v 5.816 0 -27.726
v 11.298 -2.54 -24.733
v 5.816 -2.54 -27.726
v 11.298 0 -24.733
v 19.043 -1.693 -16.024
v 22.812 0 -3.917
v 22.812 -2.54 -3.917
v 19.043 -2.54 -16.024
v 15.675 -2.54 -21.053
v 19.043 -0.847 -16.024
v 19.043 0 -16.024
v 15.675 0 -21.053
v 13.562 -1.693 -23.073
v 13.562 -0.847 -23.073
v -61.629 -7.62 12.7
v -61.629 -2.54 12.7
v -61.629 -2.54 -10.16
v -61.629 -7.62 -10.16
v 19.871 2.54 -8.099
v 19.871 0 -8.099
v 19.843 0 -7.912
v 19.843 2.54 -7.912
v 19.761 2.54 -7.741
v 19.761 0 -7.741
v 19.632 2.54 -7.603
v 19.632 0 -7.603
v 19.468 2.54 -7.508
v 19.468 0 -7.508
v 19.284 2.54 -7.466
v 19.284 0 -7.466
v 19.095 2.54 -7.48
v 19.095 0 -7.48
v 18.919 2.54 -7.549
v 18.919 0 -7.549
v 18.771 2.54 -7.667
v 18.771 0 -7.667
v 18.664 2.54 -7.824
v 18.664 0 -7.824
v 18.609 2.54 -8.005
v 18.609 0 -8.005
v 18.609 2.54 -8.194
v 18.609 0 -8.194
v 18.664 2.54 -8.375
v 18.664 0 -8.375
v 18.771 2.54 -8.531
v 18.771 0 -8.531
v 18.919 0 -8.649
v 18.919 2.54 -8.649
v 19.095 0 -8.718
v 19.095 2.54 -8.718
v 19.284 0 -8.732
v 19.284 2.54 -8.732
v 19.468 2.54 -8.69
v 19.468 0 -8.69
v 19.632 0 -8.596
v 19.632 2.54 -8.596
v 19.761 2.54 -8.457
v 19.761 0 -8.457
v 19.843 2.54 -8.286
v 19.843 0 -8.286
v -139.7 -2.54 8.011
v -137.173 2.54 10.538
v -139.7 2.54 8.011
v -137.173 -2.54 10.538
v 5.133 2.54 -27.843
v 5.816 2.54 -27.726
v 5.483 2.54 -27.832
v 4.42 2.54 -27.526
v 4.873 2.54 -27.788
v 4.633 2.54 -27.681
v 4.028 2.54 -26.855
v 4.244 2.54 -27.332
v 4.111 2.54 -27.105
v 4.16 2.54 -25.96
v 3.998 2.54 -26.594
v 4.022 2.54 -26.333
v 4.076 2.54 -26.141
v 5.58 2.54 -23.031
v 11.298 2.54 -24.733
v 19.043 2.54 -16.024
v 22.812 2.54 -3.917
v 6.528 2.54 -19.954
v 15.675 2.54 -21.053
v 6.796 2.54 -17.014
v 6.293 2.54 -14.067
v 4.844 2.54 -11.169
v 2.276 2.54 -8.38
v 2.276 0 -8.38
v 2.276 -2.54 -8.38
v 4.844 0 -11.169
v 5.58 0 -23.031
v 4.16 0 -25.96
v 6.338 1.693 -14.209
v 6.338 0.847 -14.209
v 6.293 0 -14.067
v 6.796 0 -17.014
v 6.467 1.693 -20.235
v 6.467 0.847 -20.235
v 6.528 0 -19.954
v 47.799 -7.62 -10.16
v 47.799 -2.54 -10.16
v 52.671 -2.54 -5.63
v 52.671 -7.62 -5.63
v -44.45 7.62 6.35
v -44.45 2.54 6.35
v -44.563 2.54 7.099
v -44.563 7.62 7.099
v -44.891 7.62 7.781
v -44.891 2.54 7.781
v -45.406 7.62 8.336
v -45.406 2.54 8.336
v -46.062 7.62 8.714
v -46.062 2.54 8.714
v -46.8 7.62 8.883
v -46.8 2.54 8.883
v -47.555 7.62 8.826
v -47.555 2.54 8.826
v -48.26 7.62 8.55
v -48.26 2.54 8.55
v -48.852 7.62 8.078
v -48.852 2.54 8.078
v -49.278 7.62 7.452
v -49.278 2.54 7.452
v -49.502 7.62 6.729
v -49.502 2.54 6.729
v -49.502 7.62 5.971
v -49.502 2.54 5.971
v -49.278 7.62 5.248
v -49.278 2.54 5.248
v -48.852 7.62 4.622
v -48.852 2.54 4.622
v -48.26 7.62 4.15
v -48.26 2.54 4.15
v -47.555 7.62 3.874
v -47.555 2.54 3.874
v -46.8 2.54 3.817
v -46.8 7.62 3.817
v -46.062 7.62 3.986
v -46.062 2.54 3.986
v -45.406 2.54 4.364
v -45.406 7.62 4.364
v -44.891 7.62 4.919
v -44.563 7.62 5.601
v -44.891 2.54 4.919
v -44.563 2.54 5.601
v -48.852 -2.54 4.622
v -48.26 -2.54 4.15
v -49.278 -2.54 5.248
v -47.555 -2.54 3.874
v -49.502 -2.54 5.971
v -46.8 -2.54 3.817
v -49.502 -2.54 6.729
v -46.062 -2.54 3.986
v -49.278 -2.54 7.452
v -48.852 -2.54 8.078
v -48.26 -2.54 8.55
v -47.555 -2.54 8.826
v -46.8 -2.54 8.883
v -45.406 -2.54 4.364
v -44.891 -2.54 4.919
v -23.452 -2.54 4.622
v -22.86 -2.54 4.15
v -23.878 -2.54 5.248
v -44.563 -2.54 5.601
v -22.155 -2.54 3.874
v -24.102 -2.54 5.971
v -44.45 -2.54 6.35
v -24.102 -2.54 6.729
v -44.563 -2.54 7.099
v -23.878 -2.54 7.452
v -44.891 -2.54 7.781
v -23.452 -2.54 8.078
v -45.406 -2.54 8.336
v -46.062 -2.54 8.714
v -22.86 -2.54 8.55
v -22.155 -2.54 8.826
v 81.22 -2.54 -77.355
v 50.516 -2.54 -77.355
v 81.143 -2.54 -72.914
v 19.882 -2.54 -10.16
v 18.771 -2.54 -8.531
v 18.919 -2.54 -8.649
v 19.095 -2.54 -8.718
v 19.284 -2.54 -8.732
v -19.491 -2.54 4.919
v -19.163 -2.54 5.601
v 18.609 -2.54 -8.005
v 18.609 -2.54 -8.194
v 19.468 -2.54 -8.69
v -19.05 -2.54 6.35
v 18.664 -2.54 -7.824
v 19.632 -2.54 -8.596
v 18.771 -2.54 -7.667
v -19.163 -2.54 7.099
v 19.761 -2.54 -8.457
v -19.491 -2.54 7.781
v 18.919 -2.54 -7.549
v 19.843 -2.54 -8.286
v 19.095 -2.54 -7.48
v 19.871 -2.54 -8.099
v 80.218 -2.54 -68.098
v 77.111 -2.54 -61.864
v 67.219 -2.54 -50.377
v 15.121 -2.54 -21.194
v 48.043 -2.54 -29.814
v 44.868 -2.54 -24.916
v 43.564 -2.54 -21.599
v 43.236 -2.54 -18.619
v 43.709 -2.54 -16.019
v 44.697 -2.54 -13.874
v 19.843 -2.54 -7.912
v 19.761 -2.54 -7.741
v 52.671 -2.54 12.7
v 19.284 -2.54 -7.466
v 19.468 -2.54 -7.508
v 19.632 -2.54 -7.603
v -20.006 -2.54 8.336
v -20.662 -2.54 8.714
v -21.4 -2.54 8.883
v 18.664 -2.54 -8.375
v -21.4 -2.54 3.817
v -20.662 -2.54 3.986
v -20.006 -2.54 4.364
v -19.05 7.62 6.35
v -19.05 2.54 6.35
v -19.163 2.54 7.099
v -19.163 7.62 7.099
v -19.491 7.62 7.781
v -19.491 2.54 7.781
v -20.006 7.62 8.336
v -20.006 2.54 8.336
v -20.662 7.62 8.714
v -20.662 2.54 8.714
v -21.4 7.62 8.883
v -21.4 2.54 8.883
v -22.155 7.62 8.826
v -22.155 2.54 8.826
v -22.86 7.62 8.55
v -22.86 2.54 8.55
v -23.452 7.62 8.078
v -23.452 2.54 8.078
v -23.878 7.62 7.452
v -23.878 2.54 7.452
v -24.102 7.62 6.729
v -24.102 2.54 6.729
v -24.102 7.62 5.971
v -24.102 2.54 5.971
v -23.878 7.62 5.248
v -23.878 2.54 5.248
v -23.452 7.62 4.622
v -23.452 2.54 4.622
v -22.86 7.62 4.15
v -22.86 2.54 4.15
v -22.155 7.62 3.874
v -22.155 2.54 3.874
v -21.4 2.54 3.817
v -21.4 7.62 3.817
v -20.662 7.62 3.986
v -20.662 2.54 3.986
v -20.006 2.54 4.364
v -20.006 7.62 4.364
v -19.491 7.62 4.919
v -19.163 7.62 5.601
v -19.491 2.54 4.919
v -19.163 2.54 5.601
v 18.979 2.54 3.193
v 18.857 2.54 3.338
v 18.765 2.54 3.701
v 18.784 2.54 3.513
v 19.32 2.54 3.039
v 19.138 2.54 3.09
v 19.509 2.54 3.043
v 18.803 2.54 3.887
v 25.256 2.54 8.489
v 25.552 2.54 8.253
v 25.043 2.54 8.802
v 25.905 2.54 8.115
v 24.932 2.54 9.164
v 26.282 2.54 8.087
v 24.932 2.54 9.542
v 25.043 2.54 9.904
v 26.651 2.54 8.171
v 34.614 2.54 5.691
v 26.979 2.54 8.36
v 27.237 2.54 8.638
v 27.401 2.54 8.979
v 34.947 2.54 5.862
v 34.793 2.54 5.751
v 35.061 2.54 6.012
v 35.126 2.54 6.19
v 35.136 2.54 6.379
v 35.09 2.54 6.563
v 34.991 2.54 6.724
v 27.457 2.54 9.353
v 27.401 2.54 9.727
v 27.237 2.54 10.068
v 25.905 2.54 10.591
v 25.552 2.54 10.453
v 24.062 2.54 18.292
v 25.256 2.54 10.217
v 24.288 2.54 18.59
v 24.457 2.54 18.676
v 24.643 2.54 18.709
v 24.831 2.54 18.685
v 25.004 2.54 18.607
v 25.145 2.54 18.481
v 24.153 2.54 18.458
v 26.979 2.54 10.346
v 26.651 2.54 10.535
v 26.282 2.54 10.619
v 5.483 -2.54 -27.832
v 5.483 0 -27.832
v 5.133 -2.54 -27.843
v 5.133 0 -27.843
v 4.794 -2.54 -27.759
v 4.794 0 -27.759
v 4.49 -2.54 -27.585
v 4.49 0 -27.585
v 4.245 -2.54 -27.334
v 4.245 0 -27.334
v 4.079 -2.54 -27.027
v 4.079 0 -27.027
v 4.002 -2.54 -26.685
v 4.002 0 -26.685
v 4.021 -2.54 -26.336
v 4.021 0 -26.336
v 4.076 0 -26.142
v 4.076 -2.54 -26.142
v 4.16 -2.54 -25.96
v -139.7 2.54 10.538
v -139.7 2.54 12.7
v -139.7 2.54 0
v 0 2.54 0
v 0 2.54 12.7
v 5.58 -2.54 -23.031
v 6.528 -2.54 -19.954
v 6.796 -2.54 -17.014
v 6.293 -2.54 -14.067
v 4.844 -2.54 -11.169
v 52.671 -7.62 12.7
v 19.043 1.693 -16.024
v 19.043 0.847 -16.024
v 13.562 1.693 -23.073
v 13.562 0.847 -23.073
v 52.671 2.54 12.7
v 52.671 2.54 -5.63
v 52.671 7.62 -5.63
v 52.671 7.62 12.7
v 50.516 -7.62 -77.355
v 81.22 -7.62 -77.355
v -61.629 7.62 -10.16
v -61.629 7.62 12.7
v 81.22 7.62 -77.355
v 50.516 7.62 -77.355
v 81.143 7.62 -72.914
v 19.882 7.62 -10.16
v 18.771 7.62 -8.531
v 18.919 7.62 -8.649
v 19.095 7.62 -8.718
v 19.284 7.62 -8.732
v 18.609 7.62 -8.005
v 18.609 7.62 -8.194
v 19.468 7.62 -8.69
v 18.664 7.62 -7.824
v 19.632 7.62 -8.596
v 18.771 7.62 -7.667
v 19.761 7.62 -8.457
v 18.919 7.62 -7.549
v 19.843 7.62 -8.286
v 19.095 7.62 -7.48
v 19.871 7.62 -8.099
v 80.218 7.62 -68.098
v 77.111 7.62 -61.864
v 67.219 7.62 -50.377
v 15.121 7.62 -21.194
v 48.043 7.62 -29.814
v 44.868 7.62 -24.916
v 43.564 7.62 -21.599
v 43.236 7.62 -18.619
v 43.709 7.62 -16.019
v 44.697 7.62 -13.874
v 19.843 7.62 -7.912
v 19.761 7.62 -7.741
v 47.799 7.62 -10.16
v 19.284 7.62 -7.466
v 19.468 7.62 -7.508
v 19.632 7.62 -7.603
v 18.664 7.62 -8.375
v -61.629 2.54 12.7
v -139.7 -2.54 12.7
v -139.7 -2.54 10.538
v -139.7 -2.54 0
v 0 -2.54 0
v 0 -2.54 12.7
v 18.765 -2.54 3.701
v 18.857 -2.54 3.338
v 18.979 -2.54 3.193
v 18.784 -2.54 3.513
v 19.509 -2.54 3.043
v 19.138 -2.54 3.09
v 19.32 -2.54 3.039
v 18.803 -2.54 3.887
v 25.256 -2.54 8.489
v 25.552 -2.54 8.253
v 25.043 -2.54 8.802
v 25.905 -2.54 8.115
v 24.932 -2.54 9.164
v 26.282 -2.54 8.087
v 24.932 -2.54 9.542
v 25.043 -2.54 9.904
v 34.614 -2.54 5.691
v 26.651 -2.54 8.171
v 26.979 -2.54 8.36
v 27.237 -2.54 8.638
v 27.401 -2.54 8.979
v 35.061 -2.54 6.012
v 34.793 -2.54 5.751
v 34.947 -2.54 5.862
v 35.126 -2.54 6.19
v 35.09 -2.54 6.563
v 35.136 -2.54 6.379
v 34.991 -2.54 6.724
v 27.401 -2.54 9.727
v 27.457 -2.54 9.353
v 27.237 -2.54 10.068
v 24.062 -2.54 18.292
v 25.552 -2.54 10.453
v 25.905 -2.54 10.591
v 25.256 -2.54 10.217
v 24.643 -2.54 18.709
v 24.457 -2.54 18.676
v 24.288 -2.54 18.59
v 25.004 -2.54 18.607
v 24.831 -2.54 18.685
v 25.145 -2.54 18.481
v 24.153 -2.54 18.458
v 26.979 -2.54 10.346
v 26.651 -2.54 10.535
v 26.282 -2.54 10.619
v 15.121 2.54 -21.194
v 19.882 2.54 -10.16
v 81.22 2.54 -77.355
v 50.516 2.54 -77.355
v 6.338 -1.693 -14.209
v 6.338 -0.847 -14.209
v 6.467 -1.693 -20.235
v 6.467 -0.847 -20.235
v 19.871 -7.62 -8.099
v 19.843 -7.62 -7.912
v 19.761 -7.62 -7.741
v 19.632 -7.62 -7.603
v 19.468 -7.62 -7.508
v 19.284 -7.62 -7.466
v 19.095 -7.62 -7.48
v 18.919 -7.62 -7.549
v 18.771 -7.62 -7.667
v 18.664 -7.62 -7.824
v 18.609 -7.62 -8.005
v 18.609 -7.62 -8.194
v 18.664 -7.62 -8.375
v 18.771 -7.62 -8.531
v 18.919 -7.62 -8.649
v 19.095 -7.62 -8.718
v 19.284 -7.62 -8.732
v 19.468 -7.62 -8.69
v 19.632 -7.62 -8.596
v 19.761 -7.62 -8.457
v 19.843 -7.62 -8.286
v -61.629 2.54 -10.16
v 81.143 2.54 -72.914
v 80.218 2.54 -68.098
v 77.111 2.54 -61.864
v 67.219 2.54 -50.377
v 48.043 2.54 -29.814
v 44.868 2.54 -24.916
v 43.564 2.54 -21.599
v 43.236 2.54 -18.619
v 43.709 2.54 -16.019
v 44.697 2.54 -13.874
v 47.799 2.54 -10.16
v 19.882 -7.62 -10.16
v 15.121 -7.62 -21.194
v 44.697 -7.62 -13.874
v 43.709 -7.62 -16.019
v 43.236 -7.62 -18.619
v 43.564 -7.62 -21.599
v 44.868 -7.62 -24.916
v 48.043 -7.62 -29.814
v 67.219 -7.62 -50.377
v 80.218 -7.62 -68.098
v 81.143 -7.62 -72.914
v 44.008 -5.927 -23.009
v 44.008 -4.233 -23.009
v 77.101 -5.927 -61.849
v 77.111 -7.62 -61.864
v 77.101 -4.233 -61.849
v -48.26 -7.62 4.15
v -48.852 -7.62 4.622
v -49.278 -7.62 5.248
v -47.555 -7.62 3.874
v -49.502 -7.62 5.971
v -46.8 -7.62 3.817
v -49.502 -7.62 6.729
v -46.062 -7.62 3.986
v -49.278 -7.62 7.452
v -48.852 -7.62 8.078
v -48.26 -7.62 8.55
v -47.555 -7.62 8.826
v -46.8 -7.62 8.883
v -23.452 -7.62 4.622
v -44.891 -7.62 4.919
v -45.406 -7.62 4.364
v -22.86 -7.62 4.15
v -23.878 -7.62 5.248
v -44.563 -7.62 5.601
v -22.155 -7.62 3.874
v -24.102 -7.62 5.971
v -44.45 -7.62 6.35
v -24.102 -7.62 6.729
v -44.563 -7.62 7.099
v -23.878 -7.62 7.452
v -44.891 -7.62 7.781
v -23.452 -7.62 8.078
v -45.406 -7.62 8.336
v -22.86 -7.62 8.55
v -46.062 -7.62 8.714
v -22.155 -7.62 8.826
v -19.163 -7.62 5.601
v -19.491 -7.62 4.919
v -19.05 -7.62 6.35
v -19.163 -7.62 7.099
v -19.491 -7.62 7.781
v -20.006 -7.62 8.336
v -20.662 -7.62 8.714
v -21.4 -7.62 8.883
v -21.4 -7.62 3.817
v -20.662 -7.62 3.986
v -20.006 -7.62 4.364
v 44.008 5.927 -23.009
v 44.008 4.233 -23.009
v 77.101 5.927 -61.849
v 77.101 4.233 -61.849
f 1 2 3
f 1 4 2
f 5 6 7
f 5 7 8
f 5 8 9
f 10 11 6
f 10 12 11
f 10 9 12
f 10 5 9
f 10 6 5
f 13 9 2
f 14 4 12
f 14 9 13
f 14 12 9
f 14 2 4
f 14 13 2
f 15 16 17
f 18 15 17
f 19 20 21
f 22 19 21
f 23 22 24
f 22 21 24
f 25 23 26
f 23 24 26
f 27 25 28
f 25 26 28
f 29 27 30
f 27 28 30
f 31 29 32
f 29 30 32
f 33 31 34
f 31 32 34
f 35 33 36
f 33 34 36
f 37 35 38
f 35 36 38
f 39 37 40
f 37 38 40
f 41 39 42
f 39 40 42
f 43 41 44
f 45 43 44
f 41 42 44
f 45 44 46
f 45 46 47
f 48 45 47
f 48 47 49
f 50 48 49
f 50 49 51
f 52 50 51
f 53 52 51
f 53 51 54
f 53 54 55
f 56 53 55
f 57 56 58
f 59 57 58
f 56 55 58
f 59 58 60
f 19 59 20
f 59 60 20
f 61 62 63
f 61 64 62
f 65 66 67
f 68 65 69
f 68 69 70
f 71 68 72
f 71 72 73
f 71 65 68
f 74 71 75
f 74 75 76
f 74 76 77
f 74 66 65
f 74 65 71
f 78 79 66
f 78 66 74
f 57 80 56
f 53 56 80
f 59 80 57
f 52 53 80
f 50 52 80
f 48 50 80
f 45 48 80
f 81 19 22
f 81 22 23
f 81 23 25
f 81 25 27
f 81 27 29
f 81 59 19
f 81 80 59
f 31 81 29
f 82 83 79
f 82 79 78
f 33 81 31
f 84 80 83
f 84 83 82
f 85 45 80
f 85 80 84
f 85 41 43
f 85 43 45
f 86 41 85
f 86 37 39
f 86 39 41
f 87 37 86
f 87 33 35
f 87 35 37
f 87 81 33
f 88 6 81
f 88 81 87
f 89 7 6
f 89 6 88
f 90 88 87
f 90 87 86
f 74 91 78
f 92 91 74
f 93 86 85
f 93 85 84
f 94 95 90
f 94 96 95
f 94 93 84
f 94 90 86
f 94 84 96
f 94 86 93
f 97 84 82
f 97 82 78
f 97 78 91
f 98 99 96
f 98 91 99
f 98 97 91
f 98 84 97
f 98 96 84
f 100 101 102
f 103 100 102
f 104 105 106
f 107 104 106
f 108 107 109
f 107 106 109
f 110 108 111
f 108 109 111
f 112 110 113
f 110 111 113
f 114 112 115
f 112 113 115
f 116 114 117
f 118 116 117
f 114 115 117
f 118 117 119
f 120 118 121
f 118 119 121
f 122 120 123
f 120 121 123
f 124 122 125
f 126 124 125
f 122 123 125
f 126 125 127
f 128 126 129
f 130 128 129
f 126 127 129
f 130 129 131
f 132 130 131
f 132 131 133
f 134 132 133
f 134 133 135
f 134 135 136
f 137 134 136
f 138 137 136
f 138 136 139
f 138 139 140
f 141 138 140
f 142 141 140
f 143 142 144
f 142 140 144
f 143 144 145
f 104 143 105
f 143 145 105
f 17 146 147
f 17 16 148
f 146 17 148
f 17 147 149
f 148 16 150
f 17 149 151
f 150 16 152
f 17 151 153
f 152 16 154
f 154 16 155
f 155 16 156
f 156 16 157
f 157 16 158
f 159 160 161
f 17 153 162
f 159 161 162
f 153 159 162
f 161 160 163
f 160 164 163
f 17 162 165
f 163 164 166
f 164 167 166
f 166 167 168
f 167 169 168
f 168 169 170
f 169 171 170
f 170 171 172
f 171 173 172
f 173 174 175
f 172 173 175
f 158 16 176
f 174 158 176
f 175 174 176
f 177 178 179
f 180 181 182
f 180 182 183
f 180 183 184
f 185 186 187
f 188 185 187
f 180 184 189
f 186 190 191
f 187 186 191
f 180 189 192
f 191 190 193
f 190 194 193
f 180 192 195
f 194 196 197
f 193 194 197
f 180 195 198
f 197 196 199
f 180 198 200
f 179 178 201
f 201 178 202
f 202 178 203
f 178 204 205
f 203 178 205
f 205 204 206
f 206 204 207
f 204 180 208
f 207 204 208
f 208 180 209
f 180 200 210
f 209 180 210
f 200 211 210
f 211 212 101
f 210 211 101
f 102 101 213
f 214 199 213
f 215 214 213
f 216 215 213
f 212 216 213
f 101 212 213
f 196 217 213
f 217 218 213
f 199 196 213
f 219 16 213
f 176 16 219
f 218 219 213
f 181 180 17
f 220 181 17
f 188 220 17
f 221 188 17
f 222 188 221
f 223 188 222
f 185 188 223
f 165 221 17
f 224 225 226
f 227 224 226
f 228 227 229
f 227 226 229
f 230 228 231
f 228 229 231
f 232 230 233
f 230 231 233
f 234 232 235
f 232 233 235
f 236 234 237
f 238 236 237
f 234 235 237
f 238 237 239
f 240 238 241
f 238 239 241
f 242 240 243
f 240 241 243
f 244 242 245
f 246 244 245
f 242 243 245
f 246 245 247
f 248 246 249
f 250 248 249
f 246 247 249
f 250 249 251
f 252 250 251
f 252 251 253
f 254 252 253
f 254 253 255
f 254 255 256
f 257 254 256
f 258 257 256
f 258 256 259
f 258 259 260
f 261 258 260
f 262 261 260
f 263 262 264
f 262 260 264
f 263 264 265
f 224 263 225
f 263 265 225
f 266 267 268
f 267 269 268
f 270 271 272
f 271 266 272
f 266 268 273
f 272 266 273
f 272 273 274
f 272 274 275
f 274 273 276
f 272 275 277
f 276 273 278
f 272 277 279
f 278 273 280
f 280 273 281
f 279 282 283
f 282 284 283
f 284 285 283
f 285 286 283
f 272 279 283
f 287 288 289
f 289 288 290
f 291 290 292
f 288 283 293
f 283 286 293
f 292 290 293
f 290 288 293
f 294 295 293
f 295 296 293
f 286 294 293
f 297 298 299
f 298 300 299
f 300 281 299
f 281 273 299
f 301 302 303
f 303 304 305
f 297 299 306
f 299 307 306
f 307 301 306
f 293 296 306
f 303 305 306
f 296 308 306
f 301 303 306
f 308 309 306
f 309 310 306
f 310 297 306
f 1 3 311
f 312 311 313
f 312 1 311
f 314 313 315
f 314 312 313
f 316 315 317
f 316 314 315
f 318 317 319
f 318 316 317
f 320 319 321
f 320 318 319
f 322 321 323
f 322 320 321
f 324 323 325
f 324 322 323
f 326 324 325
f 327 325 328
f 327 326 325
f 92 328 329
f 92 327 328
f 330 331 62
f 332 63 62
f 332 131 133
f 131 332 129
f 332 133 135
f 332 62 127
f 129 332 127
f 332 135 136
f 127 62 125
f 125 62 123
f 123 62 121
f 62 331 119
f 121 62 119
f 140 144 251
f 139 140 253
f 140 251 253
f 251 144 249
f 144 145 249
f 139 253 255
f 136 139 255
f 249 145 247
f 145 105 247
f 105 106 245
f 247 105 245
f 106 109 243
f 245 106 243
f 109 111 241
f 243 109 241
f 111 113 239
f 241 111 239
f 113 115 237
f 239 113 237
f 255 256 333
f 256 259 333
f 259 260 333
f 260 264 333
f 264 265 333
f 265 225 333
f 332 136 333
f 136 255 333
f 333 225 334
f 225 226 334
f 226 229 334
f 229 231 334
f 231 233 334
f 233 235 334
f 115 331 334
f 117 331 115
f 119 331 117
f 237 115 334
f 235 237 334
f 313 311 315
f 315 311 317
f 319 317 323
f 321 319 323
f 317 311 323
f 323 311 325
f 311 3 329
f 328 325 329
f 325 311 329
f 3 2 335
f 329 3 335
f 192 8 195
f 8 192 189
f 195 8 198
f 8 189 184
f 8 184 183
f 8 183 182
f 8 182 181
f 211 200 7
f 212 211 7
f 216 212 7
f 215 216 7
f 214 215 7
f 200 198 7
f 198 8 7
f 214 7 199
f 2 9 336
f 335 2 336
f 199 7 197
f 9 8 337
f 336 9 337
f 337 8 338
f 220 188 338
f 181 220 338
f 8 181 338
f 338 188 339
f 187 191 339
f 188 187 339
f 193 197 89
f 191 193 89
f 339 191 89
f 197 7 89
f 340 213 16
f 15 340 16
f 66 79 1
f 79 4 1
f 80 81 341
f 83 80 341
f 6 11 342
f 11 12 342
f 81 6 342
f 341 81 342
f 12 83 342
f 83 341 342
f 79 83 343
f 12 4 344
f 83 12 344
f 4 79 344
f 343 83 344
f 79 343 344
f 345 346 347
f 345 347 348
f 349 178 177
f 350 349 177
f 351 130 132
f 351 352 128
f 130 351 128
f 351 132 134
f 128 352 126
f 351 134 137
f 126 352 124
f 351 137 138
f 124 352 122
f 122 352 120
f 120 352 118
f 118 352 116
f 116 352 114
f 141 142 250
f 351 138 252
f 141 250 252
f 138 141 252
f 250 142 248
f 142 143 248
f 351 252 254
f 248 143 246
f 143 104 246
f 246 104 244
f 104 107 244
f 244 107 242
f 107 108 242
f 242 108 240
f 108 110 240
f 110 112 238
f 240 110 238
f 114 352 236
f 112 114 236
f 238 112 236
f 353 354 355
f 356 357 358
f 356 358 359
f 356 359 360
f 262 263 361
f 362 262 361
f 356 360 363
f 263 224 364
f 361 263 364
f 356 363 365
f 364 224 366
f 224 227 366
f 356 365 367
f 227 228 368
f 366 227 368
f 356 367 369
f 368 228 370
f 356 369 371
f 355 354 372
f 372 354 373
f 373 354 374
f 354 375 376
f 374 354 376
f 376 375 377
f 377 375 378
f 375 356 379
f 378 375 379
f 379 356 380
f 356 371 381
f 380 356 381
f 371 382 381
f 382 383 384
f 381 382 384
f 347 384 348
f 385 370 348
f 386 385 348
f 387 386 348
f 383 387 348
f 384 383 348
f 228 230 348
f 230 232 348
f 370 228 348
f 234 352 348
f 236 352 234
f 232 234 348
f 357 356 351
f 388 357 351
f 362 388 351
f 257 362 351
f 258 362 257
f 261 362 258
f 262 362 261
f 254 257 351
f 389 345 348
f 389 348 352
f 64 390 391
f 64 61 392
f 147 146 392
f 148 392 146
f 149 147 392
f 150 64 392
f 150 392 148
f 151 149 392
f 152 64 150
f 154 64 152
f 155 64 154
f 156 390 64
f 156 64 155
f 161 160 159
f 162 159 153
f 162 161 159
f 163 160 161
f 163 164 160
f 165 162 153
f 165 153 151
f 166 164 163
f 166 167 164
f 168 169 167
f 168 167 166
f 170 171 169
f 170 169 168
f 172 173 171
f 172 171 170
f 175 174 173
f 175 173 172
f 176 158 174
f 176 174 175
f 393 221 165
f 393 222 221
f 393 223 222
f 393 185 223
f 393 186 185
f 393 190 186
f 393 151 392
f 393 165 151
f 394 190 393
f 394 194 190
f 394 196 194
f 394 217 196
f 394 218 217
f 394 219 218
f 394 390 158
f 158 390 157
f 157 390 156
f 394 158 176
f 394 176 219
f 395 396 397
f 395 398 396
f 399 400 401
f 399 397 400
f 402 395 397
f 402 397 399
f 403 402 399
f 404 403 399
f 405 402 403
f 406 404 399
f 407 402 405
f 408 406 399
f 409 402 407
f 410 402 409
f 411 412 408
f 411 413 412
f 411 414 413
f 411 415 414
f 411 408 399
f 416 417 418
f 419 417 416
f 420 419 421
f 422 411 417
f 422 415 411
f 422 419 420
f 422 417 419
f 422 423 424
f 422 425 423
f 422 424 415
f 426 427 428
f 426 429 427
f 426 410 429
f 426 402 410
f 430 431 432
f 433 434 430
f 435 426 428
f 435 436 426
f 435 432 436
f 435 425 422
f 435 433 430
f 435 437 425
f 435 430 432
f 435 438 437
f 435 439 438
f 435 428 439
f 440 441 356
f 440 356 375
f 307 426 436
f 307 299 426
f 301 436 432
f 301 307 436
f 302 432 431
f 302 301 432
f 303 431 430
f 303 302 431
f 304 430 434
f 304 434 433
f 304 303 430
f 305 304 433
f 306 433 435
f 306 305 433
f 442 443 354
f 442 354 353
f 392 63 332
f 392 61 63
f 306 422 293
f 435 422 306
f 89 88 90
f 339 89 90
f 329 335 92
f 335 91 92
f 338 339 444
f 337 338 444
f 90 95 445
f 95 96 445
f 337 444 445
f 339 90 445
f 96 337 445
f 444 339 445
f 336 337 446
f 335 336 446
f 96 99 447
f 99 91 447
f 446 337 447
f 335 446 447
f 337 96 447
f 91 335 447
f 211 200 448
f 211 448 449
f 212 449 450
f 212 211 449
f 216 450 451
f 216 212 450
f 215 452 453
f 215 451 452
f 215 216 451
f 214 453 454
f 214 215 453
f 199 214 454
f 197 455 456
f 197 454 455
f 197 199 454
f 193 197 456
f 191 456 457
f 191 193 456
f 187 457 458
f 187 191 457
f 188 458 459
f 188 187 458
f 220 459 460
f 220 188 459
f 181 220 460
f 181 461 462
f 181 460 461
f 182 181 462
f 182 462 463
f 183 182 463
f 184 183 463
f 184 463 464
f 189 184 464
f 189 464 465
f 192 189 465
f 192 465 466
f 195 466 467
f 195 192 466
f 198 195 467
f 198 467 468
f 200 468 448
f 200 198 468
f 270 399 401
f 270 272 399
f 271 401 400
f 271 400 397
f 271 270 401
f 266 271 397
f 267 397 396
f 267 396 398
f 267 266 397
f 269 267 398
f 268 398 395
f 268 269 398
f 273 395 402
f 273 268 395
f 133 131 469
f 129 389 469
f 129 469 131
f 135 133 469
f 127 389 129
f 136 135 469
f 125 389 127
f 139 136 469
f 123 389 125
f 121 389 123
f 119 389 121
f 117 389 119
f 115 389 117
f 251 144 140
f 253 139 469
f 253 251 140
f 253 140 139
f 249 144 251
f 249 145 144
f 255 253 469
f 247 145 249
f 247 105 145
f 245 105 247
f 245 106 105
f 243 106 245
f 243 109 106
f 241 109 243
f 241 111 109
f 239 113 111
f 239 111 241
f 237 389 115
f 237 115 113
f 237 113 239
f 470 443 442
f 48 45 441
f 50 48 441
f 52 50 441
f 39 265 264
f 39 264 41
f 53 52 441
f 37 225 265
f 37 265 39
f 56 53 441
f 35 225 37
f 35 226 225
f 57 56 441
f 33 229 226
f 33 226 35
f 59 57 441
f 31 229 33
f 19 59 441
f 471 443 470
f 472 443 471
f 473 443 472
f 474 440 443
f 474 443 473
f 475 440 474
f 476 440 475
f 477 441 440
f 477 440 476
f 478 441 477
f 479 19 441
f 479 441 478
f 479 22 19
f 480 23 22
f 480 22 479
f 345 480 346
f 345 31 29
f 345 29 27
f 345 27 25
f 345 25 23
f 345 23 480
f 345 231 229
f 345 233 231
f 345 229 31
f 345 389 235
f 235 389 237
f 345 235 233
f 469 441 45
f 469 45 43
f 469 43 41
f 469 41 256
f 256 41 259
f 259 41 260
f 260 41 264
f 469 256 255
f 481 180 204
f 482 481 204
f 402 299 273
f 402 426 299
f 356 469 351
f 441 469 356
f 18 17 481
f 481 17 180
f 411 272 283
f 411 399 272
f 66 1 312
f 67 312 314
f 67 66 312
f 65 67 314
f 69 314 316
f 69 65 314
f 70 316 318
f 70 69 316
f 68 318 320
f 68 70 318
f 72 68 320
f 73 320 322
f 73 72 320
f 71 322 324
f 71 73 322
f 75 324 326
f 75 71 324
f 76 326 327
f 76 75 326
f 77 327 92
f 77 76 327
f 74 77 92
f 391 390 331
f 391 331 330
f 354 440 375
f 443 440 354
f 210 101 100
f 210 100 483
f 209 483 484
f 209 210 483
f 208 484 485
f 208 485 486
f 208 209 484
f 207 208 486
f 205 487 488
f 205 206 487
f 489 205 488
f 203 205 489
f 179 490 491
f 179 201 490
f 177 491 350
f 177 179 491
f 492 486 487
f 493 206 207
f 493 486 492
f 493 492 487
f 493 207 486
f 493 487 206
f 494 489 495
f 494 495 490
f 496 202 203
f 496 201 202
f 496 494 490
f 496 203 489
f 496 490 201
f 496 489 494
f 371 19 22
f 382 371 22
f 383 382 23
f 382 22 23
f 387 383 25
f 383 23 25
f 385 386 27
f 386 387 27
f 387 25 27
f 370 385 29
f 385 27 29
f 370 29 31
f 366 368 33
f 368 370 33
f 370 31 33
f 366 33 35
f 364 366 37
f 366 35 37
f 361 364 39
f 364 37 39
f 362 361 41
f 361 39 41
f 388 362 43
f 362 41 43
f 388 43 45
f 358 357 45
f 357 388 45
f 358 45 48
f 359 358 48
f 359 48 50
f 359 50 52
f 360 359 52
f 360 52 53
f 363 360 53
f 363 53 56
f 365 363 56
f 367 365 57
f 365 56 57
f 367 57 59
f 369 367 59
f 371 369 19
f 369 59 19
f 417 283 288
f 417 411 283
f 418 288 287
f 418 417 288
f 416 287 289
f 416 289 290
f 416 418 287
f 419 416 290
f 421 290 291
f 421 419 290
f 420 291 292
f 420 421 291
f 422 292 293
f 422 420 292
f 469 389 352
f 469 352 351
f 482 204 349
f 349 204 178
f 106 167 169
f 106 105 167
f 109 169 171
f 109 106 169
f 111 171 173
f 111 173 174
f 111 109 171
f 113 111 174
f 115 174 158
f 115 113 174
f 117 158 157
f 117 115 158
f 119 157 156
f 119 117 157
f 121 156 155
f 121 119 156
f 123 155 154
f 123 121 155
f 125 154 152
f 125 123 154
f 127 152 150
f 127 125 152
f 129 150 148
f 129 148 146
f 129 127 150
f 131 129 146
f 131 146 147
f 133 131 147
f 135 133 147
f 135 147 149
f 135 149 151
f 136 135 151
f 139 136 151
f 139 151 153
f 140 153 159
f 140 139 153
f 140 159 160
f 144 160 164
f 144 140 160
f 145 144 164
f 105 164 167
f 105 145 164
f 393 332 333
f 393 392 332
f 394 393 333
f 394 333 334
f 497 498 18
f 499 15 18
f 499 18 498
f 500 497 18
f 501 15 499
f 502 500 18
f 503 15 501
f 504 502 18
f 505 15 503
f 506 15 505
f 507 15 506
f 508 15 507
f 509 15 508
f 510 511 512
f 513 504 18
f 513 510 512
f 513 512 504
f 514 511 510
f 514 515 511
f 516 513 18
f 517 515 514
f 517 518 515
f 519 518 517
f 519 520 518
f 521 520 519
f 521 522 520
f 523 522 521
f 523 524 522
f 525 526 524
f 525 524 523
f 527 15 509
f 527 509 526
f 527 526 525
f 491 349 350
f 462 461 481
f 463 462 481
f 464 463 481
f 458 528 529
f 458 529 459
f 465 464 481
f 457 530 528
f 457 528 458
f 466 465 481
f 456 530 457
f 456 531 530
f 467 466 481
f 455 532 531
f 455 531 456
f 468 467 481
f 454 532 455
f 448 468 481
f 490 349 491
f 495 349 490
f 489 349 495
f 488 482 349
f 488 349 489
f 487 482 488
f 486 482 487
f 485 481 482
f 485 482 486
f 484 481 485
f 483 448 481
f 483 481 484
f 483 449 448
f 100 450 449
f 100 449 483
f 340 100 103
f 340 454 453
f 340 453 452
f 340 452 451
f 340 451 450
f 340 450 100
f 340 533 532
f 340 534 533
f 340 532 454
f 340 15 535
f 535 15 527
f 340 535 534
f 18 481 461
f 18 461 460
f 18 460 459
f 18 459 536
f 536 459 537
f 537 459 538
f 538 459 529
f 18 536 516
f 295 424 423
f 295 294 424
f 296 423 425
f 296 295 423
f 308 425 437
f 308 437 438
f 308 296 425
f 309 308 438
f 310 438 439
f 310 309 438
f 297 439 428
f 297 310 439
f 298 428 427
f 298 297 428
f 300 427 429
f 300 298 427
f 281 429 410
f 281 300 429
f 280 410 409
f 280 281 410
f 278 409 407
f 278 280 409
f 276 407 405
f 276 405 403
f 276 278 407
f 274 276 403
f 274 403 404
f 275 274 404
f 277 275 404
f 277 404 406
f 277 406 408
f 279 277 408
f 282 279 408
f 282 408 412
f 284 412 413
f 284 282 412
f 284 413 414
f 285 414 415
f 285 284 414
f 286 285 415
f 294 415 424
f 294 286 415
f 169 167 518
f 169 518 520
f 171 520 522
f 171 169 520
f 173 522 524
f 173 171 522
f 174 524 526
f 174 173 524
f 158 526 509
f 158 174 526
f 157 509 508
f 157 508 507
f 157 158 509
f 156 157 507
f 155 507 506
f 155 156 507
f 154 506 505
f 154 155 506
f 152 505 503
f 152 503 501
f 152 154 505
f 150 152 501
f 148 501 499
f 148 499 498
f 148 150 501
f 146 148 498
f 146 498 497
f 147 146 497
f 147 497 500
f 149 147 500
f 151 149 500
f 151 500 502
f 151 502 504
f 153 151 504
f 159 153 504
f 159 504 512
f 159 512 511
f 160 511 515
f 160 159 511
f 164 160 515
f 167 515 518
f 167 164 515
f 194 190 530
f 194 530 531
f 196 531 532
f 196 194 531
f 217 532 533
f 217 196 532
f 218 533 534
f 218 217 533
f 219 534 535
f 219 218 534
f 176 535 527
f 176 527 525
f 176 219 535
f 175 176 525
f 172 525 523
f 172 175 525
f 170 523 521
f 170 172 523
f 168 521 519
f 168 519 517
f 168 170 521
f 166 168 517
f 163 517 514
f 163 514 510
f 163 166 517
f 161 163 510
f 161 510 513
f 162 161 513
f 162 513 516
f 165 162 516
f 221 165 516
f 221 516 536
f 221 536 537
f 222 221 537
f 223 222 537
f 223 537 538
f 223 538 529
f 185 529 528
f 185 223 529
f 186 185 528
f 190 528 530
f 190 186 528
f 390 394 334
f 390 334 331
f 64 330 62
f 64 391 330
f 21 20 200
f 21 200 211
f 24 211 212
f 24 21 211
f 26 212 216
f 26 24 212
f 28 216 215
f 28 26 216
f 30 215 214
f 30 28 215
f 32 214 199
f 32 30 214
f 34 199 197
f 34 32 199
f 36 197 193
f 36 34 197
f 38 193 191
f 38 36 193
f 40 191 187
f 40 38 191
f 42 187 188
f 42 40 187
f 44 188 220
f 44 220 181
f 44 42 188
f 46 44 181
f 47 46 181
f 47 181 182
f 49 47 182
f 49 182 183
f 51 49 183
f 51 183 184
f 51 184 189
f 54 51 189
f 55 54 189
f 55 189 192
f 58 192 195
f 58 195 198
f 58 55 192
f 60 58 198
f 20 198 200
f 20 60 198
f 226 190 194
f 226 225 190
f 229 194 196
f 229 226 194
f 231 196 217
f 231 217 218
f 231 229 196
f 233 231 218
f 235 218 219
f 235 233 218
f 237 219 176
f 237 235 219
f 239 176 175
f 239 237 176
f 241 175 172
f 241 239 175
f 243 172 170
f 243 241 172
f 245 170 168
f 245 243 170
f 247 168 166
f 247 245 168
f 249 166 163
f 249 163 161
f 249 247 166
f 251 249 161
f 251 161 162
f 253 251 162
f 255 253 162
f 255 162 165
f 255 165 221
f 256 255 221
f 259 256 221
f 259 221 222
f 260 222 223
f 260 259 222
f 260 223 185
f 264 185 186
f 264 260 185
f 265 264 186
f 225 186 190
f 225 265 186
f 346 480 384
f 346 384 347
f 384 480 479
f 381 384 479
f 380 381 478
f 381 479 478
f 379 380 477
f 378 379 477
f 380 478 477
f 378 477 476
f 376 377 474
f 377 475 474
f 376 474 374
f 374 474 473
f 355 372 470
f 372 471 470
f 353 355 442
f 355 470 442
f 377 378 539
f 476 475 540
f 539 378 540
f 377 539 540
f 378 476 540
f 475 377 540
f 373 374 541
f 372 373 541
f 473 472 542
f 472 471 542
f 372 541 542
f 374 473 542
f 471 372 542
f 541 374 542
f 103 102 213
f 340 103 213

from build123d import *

# Parameters (mm, degrees)
F0_R      = 2.54
F1_DEPTH  = 2.54
F2_W      = 61.6293519594
F2_H      = 12.7
F2_R      = 2.54
F3_DEPTH  = 5.08
F4_R      = 0.635
F5_DEPTH  = 2.54
F6_DEPTH  = 7.6210001
F8_R      = 1.27
F9_R      = 1.27
F10_DEPTH = 2.54
F11_R     = 0.635


# Not quite as in the source:
# - the program builds the solid bodies; features that only make, move or delete a surface that nothing else refers to are left out


with BuildPart() as f1:
    # F0 (on Front) → F1 (new body, symmetric)
    with BuildSketch(Plane.XZ):
        Polygon((-139.7, 0), (0, 0), (0, 12.7), (-139.7, 12.7), (-139.7, 10.5376646731), (-137.1728569348, 10.5376646731), (-139.7, 8.0105216078), align=None)
        with Locations((-46.99, 6.35)):
            Circle(F0_R, mode=Mode.SUBTRACT)
        with Locations((-21.59, 6.35)):
            Circle(F0_R, mode=Mode.SUBTRACT)
    extrude(amount=F1_DEPTH, both=True)


with BuildPart() as f3:
    # F2 (on face) → F3 (new body)
    with BuildSketch(Plane.XZ.offset(2.54)):
        with BuildLine():
            Line((52.6706480406, 12.7), (0, 12.7))
            Line((0, 12.7), (0, 0))
            Line((0, 0), (-61.6293519594, 0))
            Line((-61.6293519594, 0), (-61.6293519594, -10.16))
            Line((-61.6293519594, -10.16), (19.8817028996, -10.16))
            Line((19.8817028996, -10.16), (15.1211905229, -21.1940087392))
            Line((15.1211905229, -21.1940087392), (50.5158929033, -77.355248563))
            Line((50.5158929033, -77.355248563), (81.2204327985, -77.355248563))
            add(Edge.make_bspline(
                [(47.799121146, -10.16), (44.3482648072, -13.3692479995), (37.1454276866, -25.357169668), (81.4992006887, -59.9064139099), (81.2842977033, -72.8161541739), (81.2204327985, -77.355248563)],
                knots=[0, 0, 0, 0, 0.2471584038, 0.7295165006, 1, 1, 1, 1], degree=3))
            Line((47.799121146, -10.16), (52.6706480406, -5.6295483074))
            Line((52.6706480406, -5.6295483074), (52.6706480406, 12.7))
        make_face()
        with Locations((-30.8146759797, 6.35)):
            Rectangle(F2_W, F2_H)
        with Locations((-46.99, 6.35)):
            Circle(F2_R, mode=Mode.SUBTRACT)
        with Locations((-21.59, 6.35)):
            Circle(F2_R, mode=Mode.SUBTRACT)
    extrude(amount=F3_DEPTH)

    # F4 (on Front) → F6 (cut, through all)
    with BuildSketch(Plane.XZ):
        with Locations((19.2364566028, -8.0991536379)):
            Circle(F4_R)
    extrude(amount=F6_DEPTH, mode=Mode.SUBTRACT)


with BuildPart() as f5:
    # F4 (on Front) → F5 (new body, symmetric)
    with BuildSketch(Plane.XZ):
        with BuildLine():
            add(Edge.make_bspline(
                [(22.8122286499, -3.9173178375), (19.2917461197, -21.5543570618), (13.5305089255, -24.243020763), (1.8707671043, -29.552931826)],
                knots=[0, 0, 0, 0, 33.1018053319, 33.1018053319, 33.1018053319, 33.1018053319], degree=3))
            Line((22.8122286499, -3.9173178375), (2.2755871012, -8.3797141855))
            add(Edge.make_bspline(
                [(2.2755871012, -8.3797141855), (10.3401988745, -15.254676342), (5.9748672721, -23.7269168006), (1.8707671043, -29.552931826)],
                knots=[0, 0, 0, 0, 21.1770872521, 21.1770872521, 21.1770872521, 21.1770872521], degree=3))
        make_face()
        with Locations((19.2364566028, -8.0991536379)):
            Circle(F4_R, mode=Mode.SUBTRACT)
    extrude(amount=F5_DEPTH, both=True)

    # F8
    f8_edges = [f5.edges().sort_by_distance(p)[0] for p in [
        (1.870767, 1.27, -29.552932),
        (1.870767, -1.27, -29.552932),
    ]]
    fillet(f8_edges, radius=F8_R)


with BuildPart() as f7_1:
    # F7: instance of F3
    add(f3.part.mirror(Plane.XZ))


with BuildPart() as f10:
    # F9 (on Front) → F10 (new body, symmetric)
    with BuildSketch(Plane.XZ):
        Polygon((18.4256873853, 2.853382407), (35.6970995837, 5.8810384254), (24.4393664586, 19.3246921392), align=None)
        with Locations((26.1873844759, 9.3530376572)):
            Circle(F9_R, mode=Mode.SUBTRACT)
    extrude(amount=F10_DEPTH, both=True)

    # F11
    f11_edges = [f10.edges().sort_by_distance(p)[0] for p in [
        (24.439366, 0, 19.324692),
        (35.6971, 0, 5.881038),
        (18.425687, 0, 2.853382),
    ]]
    fillet(f11_edges, radius=F11_R)


solid = Compound([f1.part, f3.part, f5.part, f7_1.part, f10.part])
